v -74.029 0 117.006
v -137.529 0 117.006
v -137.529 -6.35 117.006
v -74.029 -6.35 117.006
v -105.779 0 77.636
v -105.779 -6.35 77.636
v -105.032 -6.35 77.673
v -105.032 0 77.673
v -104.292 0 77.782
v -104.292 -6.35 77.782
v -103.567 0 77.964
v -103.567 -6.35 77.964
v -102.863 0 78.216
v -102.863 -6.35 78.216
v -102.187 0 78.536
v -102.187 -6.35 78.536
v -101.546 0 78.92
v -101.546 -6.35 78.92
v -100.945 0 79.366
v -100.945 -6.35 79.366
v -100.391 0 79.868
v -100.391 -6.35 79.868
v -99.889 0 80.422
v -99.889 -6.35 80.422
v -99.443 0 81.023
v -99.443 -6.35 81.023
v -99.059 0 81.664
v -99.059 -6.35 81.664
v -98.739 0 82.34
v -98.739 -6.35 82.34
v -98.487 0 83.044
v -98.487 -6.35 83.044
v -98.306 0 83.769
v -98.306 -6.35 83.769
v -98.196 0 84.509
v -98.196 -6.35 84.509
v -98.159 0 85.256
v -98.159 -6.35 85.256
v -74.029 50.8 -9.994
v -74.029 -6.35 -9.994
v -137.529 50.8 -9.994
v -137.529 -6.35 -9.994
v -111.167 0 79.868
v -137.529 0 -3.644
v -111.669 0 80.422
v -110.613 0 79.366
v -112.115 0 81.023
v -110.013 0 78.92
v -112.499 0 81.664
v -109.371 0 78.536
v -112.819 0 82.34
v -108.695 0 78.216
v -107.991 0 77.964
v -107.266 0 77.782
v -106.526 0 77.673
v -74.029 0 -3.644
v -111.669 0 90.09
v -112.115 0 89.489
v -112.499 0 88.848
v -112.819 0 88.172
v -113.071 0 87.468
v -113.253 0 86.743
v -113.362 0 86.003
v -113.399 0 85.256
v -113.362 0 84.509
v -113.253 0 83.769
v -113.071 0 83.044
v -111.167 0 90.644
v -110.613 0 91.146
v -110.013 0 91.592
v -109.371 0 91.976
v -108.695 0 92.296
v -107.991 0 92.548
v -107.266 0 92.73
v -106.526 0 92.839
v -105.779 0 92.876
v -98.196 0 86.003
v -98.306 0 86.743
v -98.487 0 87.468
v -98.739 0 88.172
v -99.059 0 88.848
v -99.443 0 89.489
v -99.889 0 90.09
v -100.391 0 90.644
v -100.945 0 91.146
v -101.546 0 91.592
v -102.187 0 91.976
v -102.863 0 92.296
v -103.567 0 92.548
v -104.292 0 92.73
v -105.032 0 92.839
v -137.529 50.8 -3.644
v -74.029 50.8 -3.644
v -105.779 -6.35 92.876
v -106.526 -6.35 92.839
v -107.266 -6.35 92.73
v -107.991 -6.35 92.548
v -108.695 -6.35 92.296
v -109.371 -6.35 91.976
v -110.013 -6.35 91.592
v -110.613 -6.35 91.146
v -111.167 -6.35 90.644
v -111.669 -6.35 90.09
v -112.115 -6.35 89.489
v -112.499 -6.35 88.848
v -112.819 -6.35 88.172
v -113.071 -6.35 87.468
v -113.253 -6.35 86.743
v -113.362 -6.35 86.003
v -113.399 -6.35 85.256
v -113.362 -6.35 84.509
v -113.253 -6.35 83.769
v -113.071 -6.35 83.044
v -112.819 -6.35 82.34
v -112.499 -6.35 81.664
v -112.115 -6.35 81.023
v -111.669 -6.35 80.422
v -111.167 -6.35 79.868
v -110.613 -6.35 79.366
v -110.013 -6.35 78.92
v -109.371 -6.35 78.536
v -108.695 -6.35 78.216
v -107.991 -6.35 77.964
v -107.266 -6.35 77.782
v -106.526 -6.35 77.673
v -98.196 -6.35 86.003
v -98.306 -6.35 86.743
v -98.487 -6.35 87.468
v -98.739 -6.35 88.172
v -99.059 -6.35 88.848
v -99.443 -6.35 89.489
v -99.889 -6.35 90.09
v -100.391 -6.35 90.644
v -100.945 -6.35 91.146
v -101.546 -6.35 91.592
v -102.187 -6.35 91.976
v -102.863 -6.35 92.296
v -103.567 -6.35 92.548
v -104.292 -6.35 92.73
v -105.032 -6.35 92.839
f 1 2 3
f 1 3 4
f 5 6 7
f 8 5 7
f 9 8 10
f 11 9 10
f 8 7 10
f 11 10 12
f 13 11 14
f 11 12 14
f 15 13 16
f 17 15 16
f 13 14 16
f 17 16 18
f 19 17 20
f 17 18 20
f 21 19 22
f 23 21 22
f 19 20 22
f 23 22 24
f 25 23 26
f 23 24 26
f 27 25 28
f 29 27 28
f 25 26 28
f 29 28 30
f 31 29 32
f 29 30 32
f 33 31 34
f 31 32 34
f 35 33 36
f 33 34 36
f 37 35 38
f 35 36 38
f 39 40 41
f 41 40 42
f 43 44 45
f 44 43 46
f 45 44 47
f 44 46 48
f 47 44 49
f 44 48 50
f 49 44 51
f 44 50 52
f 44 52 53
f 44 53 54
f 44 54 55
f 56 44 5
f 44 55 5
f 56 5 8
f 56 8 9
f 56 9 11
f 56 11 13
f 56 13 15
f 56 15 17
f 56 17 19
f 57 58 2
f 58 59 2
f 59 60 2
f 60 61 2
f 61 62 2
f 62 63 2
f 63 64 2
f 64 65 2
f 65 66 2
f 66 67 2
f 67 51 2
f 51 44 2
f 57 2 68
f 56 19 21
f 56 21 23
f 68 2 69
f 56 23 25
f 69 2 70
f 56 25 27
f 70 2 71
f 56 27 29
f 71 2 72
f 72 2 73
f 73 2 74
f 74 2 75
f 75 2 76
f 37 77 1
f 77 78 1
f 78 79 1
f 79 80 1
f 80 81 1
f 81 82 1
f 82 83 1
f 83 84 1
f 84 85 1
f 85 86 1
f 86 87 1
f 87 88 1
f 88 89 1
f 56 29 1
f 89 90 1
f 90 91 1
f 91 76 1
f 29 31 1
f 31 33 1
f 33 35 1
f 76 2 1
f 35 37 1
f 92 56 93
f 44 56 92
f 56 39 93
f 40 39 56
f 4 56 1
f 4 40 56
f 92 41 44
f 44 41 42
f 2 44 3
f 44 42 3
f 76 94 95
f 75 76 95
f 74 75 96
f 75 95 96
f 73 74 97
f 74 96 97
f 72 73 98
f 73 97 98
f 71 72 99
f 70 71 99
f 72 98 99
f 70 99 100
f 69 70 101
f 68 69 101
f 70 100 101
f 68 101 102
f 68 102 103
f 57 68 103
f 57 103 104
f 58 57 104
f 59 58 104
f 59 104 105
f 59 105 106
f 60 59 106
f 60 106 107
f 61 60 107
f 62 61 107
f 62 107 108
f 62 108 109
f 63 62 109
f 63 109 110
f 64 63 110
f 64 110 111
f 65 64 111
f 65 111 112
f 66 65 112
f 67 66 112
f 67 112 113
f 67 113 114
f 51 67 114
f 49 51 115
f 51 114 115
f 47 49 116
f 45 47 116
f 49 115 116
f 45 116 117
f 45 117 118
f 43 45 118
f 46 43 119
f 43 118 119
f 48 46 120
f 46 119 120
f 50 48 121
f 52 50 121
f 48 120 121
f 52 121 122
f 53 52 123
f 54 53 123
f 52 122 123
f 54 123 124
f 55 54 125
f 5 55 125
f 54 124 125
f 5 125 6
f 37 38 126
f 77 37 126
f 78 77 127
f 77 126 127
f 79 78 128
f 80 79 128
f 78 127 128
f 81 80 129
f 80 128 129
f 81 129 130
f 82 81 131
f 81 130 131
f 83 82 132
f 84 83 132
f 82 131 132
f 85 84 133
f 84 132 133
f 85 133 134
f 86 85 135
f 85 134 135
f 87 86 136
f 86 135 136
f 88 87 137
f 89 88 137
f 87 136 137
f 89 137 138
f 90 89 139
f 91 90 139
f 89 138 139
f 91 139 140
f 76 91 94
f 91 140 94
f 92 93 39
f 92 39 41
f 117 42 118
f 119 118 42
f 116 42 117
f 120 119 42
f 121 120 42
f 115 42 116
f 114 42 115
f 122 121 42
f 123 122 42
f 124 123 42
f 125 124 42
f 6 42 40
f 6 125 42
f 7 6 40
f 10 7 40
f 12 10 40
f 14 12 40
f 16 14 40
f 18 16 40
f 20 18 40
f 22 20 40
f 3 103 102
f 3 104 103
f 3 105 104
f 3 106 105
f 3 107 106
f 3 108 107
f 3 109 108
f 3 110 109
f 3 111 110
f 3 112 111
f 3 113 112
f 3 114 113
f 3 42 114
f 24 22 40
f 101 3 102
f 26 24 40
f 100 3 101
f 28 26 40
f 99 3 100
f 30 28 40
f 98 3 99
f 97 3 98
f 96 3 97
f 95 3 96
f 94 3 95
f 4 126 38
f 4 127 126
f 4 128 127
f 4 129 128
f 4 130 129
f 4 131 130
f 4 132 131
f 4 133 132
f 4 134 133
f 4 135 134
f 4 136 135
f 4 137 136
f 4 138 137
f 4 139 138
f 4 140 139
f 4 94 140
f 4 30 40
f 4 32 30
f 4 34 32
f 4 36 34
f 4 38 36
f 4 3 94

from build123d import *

# Parameters (mm, degrees)
F0_W     = 63.5
F0_H     = 127
F1_DEPTH = 6.35
F2_W     = 63.5
F2_H     = 6.35
F3_DEPTH = 50.8
F5_DEPTH = 25.4


with BuildPart() as f1:
    # F0 (on Front) → F1 (new body)
    with BuildSketch(Plane.XZ):
        with Locations((-105.7790880203, 53.5060482323)):
            Rectangle(F0_W, F0_H)
    extrude(amount=F1_DEPTH)

    # F2 (on face) → F3 (join)
    with BuildSketch(Plane(origin=(0, 0, 0), x_dir=(-1, 0, 0), z_dir=(0, 1, 0))):
        with Locations((105.7790880203, -6.8189517677)):
            Rectangle(F2_W, F2_H)
    extrude(amount=F3_DEPTH)

    # F4 (on face) → F5 (cut)
    with BuildSketch(Plane.XZ.offset(6.35)):
        with BuildLine():
            Line((-105.7790880203, 77.6360482323), (-105.7790880203, 92.8760482323))
            ThreePointArc((-105.7790880203, 92.8760482323), (-113.3990880203, 85.2560482323), (-105.7790880203, 77.6360482323))
        make_face()
        with BuildLine():
            ThreePointArc((-98.1590880203, 85.2560482323), (-100.3909343477, 90.644201905), (-105.7790880203, 92.8760482323))
            Line((-105.7790880203, 92.8760482323), (-105.7790880203, 77.6360482323))
            ThreePointArc((-105.7790880203, 77.6360482323), (-100.3909343477, 79.8678945597), (-98.1590880203, 85.2560482323))
        make_face()
    extrude(amount=-F5_DEPTH, mode=Mode.SUBTRACT)


solid = f1.part
